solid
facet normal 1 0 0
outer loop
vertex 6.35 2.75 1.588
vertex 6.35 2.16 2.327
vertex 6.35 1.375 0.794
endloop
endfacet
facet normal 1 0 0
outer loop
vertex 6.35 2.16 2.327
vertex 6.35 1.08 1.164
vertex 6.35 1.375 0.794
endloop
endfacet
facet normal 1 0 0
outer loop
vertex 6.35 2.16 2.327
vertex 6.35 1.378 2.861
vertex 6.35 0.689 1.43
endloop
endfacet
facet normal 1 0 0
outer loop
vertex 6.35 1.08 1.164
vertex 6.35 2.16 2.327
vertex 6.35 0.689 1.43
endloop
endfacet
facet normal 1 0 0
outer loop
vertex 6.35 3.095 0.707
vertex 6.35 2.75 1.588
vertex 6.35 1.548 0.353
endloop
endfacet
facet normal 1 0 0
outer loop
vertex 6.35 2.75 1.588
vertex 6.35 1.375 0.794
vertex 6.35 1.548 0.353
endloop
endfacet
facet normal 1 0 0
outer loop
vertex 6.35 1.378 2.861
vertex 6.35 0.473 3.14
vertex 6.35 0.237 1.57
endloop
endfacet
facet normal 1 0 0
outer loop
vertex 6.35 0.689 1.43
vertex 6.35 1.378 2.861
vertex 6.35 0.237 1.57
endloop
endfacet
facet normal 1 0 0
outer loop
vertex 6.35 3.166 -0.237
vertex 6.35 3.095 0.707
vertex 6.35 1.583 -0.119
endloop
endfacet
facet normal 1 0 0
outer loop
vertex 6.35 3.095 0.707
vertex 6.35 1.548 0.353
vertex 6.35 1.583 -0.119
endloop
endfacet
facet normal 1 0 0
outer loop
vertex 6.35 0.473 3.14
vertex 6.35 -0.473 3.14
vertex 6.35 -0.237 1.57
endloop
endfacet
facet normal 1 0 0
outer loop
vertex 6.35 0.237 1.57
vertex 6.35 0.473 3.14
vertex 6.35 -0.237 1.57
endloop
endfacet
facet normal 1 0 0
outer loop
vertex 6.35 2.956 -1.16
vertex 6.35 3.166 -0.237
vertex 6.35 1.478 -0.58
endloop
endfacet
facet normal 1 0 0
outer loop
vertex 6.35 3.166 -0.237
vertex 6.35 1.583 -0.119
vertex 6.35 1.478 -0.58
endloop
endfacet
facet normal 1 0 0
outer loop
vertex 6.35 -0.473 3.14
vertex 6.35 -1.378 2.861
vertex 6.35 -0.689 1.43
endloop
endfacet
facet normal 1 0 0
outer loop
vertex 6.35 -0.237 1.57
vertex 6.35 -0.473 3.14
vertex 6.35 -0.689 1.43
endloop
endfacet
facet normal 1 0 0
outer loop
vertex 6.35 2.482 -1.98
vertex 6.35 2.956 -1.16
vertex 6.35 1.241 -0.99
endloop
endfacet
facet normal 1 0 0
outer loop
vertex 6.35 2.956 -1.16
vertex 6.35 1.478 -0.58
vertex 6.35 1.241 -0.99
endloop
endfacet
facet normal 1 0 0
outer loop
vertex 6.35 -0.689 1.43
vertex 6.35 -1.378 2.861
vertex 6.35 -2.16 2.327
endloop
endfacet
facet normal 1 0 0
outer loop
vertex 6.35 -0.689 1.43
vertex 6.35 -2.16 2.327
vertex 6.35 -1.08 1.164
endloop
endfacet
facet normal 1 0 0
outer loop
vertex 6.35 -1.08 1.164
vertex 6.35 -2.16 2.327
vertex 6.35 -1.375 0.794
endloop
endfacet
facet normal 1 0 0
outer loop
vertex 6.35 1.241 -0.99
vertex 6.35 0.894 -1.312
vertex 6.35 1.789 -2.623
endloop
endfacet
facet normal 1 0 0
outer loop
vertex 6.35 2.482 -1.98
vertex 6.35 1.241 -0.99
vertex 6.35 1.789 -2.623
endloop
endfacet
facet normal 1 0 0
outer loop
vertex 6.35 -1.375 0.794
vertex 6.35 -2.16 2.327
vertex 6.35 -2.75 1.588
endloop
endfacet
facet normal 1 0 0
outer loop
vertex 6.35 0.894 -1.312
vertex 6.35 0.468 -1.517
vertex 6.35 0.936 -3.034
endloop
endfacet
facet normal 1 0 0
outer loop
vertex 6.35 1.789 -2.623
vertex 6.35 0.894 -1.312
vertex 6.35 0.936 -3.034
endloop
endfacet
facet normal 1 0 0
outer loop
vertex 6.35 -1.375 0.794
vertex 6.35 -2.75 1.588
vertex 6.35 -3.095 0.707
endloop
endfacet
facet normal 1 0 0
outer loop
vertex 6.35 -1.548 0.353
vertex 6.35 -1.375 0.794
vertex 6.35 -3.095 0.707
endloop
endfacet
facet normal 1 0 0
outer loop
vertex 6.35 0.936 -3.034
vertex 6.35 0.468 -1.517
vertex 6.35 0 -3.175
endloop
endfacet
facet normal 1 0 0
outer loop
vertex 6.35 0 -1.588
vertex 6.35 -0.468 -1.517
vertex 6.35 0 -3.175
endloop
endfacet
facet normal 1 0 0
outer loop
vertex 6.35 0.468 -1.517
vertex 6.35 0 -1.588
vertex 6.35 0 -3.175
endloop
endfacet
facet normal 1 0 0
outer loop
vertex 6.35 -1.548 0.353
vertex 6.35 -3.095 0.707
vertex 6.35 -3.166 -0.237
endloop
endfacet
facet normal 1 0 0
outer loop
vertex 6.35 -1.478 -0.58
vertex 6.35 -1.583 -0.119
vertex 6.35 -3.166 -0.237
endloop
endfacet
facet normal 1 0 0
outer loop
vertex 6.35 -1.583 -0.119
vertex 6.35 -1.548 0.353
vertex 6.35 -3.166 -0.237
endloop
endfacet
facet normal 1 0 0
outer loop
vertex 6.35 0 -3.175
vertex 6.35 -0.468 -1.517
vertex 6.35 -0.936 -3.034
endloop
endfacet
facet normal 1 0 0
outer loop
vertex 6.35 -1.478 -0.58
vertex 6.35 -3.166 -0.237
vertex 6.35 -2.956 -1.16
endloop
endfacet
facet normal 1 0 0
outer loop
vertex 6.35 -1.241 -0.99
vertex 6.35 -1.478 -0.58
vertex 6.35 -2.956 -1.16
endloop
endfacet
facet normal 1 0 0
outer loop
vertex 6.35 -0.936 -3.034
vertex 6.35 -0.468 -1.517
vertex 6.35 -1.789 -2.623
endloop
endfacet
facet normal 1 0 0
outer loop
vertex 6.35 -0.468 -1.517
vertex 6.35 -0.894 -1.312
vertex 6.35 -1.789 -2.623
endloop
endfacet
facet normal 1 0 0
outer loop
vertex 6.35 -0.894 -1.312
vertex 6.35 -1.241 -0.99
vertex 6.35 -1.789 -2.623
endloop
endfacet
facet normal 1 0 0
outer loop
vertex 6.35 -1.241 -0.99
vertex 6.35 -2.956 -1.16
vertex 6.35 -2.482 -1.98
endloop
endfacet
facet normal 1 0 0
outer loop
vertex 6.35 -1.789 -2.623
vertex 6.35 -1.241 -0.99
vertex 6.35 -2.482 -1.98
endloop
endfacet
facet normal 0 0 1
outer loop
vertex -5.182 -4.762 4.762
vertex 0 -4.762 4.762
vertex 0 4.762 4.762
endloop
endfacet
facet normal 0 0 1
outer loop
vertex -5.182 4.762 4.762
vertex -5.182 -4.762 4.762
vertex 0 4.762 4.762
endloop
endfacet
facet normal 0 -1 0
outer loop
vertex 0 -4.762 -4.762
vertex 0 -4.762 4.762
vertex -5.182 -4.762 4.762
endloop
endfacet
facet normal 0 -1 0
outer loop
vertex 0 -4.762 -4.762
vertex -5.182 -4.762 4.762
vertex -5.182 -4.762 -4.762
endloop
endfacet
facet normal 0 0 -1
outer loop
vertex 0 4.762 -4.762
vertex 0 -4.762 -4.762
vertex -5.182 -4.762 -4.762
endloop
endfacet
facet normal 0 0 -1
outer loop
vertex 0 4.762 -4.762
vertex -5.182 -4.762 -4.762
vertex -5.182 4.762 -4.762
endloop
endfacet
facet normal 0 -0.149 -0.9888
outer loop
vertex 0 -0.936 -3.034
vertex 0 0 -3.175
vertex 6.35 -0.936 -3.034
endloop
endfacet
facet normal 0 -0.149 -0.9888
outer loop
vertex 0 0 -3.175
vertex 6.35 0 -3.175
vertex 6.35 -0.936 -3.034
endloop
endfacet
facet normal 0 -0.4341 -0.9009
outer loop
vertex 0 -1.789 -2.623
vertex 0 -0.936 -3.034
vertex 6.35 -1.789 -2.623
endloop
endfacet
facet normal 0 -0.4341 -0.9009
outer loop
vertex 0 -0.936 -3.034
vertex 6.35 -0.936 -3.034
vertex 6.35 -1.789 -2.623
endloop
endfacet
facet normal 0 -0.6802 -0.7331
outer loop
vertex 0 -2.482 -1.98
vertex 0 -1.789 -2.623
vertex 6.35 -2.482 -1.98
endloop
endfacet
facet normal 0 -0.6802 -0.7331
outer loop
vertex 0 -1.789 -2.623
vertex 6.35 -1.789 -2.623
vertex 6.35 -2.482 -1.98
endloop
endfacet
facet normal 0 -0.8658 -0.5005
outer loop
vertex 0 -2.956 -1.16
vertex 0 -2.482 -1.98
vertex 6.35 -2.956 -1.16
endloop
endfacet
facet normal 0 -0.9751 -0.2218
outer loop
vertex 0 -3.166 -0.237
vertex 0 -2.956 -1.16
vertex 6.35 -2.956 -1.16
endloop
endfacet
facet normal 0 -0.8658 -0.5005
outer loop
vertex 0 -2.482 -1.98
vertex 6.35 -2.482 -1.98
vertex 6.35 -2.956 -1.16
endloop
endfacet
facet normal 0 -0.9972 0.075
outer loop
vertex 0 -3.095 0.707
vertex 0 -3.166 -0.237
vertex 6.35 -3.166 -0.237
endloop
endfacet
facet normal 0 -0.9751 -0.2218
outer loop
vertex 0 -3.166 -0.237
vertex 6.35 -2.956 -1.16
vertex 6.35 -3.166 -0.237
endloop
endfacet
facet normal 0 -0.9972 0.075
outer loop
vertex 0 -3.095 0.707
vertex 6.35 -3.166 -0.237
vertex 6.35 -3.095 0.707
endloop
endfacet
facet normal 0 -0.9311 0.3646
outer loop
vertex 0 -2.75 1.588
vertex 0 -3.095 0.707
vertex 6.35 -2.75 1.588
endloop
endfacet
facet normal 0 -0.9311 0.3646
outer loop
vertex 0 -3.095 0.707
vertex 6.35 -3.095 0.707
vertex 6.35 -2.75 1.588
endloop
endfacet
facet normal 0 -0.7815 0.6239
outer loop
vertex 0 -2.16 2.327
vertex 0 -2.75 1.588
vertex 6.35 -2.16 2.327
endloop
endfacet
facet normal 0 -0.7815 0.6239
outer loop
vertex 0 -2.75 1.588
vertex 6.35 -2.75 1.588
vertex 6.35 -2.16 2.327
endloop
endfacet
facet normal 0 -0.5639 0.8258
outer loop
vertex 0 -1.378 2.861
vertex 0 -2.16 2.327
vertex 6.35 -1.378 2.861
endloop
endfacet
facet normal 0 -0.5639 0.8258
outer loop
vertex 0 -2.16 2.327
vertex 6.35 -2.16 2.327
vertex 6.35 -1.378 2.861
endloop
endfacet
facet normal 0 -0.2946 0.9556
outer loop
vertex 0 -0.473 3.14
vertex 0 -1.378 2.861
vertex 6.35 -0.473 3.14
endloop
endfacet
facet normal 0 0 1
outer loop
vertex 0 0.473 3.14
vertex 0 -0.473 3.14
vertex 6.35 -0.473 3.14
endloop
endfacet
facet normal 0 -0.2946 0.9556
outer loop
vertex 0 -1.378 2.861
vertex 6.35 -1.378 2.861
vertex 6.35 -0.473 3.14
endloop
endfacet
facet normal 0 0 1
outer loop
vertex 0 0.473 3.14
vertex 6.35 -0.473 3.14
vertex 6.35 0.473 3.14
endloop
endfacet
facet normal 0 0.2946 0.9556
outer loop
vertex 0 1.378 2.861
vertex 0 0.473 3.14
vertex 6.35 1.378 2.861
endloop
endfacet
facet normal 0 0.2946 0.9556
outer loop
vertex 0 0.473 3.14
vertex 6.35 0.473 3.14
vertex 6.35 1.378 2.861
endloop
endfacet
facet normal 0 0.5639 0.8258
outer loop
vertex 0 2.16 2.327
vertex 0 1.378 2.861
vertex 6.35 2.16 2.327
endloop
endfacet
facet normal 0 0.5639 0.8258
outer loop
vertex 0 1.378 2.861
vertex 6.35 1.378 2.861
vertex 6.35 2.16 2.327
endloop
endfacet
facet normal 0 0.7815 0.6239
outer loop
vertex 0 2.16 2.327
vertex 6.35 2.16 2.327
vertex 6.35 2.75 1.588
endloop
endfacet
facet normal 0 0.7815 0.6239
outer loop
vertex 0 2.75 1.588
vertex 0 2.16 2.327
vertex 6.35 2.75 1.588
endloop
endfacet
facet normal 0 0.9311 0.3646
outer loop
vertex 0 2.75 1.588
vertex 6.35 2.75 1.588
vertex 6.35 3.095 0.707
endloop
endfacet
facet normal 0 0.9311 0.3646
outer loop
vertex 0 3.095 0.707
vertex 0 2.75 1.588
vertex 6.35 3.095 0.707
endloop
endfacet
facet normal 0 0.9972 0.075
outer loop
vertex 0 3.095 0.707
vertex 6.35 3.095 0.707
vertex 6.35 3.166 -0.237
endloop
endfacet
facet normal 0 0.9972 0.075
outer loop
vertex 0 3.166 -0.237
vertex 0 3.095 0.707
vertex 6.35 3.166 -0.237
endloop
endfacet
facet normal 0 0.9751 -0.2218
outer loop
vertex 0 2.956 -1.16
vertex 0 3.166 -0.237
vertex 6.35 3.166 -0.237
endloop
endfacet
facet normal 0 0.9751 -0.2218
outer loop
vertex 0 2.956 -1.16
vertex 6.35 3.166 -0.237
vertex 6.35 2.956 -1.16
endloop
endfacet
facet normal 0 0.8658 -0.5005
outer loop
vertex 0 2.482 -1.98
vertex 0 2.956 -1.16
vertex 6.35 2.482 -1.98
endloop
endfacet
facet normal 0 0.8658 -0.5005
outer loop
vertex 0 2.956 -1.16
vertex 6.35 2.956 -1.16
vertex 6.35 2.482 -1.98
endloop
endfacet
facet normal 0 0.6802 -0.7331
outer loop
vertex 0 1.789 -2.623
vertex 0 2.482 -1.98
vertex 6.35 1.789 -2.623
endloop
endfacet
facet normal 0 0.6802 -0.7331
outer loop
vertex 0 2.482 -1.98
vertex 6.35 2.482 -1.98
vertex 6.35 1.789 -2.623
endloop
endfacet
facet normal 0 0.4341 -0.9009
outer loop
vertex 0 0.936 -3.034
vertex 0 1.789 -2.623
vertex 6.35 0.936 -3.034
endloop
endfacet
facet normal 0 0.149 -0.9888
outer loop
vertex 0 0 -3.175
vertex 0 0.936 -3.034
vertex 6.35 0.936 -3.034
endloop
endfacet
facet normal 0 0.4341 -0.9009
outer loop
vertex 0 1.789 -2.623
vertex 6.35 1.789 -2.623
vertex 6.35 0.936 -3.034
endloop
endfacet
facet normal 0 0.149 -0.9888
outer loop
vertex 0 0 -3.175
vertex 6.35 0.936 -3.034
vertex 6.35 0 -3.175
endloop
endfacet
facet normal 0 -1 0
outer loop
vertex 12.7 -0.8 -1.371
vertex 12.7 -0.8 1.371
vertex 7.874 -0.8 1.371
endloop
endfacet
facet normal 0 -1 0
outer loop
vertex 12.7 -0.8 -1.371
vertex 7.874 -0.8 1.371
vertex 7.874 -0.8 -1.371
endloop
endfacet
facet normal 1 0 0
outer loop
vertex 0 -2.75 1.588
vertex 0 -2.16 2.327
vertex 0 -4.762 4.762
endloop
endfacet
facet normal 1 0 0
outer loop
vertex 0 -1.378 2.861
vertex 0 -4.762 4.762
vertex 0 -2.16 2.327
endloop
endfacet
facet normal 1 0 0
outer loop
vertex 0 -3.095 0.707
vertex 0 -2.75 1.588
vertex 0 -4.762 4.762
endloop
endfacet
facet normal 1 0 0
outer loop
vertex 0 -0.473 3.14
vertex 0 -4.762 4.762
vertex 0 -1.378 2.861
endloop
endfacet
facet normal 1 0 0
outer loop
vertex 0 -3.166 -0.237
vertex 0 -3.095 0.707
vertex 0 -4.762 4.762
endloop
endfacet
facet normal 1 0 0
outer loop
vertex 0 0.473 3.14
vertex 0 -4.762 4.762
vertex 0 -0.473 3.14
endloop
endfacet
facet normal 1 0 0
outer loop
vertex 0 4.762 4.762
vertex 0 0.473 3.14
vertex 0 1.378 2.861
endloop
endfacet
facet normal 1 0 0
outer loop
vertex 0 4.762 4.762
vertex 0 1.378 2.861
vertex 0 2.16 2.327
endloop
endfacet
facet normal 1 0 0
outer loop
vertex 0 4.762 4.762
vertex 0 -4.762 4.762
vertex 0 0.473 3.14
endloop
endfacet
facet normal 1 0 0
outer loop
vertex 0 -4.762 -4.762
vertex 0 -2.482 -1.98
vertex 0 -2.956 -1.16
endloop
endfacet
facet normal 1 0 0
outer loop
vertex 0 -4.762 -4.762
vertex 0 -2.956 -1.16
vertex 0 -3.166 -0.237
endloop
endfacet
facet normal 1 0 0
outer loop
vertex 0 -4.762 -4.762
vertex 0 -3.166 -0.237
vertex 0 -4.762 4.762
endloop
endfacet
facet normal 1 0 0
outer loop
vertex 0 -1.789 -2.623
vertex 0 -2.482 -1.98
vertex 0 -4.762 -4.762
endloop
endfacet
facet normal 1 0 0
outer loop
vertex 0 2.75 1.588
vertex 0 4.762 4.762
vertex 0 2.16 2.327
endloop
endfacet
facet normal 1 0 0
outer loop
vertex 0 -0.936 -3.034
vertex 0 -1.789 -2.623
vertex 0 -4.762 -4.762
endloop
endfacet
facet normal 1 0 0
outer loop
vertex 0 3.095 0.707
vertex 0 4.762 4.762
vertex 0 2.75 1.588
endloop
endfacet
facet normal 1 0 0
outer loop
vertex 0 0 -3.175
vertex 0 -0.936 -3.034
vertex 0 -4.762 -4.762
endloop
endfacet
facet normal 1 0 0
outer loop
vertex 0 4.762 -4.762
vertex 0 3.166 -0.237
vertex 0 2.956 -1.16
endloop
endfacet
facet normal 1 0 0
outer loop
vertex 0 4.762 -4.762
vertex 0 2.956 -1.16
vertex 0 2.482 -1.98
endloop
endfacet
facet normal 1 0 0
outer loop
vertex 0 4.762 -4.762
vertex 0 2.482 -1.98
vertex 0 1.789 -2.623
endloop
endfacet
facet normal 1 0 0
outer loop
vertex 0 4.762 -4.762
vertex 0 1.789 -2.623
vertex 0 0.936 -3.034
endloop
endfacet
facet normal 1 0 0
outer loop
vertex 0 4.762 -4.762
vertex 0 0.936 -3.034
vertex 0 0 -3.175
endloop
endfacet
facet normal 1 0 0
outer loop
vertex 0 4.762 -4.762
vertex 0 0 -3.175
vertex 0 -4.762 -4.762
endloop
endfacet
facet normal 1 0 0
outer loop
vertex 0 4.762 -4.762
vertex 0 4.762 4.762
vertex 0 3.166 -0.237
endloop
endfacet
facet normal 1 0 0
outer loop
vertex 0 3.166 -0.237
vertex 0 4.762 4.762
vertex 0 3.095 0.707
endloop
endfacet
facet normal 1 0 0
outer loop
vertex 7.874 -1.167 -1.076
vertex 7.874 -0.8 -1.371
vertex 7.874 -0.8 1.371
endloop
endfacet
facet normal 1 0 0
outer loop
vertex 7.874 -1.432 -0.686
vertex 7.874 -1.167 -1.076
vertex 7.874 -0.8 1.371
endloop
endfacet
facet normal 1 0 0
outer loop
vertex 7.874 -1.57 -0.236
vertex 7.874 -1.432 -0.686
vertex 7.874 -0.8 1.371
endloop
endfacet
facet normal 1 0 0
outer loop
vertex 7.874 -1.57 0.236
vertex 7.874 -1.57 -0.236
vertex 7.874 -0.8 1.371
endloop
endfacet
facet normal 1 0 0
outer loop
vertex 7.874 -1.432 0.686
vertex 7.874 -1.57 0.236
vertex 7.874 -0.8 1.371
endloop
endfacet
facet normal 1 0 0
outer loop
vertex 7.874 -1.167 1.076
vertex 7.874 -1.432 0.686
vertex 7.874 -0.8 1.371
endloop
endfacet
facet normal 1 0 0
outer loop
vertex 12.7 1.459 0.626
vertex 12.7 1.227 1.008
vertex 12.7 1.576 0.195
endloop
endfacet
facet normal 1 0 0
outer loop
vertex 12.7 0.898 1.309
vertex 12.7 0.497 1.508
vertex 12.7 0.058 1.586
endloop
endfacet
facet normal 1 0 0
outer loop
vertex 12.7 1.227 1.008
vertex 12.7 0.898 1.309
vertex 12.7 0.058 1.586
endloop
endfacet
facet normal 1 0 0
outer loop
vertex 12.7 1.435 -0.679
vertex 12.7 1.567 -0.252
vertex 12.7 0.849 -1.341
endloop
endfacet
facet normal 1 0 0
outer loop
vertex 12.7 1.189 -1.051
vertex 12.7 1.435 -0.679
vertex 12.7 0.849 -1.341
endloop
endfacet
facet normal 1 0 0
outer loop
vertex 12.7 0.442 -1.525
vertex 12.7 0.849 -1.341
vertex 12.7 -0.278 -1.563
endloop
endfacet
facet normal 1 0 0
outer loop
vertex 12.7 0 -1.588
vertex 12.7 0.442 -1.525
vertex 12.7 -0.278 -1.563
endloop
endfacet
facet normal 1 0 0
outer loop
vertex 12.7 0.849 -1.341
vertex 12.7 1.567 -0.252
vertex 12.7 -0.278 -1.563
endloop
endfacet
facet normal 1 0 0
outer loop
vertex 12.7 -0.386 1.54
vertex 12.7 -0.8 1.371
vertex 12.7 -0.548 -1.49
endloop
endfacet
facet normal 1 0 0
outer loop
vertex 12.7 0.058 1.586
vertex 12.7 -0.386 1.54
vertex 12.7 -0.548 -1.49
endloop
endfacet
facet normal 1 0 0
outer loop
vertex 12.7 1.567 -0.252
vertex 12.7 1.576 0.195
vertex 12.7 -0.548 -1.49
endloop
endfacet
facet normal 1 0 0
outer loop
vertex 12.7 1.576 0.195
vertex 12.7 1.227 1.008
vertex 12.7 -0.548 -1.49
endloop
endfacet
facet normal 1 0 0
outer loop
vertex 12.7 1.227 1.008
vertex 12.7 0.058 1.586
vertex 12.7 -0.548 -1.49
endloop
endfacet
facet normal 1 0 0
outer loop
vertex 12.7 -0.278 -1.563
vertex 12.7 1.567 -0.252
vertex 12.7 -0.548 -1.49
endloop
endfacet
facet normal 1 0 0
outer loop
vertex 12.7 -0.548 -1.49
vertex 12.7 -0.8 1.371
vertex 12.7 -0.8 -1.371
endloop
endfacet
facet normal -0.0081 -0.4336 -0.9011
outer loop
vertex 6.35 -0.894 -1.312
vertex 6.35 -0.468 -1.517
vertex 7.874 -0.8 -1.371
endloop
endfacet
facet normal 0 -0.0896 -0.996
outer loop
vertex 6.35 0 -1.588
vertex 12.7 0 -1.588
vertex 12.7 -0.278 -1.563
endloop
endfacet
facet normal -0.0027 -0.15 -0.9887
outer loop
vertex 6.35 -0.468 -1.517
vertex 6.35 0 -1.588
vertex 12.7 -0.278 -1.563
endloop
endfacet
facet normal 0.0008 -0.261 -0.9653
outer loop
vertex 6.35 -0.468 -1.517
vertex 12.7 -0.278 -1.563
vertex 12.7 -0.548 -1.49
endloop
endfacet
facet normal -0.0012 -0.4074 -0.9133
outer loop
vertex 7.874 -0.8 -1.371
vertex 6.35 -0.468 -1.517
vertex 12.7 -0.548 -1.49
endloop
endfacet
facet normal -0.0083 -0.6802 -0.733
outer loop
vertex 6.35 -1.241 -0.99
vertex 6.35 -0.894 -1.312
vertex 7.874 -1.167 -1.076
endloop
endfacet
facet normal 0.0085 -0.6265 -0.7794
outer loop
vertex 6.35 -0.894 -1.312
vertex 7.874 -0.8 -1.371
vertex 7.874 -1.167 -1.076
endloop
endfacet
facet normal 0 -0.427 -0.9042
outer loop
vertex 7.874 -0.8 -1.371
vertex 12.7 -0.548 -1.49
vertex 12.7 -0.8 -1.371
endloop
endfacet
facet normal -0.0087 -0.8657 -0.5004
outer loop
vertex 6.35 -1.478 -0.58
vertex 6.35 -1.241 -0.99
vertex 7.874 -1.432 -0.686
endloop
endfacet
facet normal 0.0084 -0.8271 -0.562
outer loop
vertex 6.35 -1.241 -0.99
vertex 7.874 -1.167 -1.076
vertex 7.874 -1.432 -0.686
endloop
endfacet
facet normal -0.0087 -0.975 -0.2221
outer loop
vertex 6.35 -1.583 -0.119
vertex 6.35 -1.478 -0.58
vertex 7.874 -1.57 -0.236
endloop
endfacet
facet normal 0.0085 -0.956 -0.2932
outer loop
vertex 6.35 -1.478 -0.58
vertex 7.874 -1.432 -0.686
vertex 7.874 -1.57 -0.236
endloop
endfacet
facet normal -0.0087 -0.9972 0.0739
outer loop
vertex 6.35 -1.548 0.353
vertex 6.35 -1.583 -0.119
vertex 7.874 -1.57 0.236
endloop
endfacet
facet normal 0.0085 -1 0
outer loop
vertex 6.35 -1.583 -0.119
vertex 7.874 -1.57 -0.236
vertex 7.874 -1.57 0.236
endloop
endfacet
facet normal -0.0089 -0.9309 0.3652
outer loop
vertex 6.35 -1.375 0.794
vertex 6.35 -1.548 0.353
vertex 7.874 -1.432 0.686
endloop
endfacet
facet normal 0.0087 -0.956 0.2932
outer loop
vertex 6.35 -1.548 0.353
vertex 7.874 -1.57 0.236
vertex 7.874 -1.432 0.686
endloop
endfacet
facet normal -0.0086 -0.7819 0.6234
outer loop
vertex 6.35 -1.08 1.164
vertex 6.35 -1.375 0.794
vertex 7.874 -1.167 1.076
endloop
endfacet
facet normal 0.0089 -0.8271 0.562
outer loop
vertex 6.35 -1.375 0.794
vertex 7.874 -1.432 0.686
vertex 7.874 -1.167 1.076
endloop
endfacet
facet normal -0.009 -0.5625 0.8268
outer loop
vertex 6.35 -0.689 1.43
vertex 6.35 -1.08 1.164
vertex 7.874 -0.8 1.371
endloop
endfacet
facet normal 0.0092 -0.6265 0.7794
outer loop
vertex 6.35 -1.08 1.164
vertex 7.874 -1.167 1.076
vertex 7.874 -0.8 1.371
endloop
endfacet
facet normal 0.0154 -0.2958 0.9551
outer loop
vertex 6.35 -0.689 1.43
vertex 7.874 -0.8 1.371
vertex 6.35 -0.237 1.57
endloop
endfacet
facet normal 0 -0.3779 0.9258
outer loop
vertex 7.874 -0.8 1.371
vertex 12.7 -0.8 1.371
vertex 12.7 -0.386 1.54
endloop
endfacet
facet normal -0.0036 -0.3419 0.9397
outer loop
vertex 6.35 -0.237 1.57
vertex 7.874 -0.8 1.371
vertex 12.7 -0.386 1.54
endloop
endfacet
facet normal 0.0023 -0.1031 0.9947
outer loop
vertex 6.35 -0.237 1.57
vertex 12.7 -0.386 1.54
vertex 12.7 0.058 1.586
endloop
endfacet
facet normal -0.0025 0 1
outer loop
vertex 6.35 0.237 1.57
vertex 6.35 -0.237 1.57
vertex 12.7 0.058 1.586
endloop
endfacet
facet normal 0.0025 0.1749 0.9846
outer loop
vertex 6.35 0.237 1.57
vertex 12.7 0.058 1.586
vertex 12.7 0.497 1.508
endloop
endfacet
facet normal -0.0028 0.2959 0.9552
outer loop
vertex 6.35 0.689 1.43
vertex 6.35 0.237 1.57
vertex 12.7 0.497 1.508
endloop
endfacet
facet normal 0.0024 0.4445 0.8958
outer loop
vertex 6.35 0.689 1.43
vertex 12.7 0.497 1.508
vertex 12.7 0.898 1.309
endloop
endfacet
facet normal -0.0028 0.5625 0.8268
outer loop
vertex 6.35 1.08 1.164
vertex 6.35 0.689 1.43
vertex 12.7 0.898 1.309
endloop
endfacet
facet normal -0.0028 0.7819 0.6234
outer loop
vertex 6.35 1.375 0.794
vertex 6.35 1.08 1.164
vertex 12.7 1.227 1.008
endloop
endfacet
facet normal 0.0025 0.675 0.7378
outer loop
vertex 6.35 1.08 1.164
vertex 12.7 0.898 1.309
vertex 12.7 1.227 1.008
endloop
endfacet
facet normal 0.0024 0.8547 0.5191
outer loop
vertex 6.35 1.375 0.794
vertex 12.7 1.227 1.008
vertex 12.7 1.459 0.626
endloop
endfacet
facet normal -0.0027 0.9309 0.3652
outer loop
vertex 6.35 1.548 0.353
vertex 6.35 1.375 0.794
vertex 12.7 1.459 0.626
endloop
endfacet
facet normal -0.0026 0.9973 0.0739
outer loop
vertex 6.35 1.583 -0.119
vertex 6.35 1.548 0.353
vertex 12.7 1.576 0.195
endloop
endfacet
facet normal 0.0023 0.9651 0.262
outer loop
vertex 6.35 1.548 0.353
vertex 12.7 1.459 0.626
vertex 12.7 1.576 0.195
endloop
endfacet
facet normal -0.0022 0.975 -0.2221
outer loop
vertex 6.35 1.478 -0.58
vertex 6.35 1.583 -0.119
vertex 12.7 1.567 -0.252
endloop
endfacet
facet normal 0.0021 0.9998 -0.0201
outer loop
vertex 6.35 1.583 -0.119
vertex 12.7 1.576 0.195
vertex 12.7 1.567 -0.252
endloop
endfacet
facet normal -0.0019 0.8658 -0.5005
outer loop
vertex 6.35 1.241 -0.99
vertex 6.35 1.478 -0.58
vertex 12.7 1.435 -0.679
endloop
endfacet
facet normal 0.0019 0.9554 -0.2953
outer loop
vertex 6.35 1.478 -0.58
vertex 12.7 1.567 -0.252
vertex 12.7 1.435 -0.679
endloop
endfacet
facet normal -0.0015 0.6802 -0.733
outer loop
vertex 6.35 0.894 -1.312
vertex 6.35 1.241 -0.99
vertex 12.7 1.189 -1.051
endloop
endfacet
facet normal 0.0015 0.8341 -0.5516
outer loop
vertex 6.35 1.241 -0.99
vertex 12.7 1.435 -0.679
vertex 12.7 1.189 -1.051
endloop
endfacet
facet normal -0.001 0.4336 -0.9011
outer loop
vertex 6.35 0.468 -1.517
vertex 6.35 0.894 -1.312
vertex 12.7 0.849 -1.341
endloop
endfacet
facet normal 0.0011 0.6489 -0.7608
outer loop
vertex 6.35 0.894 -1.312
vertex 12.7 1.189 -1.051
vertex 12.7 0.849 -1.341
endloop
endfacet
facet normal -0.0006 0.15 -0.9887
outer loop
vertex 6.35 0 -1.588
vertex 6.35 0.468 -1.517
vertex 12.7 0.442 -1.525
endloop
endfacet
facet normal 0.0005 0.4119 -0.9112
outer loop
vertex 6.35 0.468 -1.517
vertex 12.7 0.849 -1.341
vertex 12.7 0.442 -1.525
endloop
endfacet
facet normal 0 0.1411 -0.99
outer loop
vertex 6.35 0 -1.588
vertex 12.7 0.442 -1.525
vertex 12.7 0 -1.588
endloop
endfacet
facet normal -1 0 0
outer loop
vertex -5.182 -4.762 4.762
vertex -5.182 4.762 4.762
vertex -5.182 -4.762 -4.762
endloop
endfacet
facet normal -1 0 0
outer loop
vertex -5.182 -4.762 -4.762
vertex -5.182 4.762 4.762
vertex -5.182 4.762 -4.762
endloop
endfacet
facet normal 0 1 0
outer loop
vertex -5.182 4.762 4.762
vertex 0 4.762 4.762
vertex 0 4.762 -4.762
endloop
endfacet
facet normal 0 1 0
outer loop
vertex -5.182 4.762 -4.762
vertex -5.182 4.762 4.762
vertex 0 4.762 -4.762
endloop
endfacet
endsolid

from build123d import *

# Parameters (mm, degrees)
SKETCH2_W           = 9.525
SKETCH2_H           = 9.525
BOSS_EXTRUDE1_DEPTH = 5.1816
CUT_EXTRUDE1_DEPTH  = 4.826


with BuildPart() as part:
    # Sketch1 → Revolve1 (revolve)
    with BuildSketch(Plane.XY, mode=Mode.PRIVATE) as revolve1_sk:
        Polygon((0, 3.175), (6.35, 3.175), (6.35, 1.5875), (12.7, 1.5875), (12.7, 0), (0, 0), align=None)
    revolve(revolve1_sk.sketch.rotate(Axis((0, 0, 0), (-1, 0, 0)), 90), axis=Axis((0, 0, 0), (-1, 0, 0)))

    # Sketch2 → Boss-Extrude1 (add)
    with BuildSketch(Plane(origin=(0, 0, 0), x_dir=(0, 0, -1), z_dir=(1, 0, 0))):
        Rectangle(SKETCH2_W, SKETCH2_H)
    extrude(amount=-BOSS_EXTRUDE1_DEPTH)

    # Sketch4 → Cut-Extrude1 (cut)
    with BuildSketch(Plane(origin=(12.7, 0, 0), x_dir=(0, 0, -1), z_dir=(1, 0, 0))):
        with BuildLine():
            Line((-1.371129549, -0.8001), (1.371129549, -0.8001))
            ThreePointArc((1.371129549, -0.8001), (0, -1.5875), (-1.371129549, -0.8001))
        make_face()
    extrude(amount=-CUT_EXTRUDE1_DEPTH, mode=Mode.SUBTRACT)


solid = part.part
